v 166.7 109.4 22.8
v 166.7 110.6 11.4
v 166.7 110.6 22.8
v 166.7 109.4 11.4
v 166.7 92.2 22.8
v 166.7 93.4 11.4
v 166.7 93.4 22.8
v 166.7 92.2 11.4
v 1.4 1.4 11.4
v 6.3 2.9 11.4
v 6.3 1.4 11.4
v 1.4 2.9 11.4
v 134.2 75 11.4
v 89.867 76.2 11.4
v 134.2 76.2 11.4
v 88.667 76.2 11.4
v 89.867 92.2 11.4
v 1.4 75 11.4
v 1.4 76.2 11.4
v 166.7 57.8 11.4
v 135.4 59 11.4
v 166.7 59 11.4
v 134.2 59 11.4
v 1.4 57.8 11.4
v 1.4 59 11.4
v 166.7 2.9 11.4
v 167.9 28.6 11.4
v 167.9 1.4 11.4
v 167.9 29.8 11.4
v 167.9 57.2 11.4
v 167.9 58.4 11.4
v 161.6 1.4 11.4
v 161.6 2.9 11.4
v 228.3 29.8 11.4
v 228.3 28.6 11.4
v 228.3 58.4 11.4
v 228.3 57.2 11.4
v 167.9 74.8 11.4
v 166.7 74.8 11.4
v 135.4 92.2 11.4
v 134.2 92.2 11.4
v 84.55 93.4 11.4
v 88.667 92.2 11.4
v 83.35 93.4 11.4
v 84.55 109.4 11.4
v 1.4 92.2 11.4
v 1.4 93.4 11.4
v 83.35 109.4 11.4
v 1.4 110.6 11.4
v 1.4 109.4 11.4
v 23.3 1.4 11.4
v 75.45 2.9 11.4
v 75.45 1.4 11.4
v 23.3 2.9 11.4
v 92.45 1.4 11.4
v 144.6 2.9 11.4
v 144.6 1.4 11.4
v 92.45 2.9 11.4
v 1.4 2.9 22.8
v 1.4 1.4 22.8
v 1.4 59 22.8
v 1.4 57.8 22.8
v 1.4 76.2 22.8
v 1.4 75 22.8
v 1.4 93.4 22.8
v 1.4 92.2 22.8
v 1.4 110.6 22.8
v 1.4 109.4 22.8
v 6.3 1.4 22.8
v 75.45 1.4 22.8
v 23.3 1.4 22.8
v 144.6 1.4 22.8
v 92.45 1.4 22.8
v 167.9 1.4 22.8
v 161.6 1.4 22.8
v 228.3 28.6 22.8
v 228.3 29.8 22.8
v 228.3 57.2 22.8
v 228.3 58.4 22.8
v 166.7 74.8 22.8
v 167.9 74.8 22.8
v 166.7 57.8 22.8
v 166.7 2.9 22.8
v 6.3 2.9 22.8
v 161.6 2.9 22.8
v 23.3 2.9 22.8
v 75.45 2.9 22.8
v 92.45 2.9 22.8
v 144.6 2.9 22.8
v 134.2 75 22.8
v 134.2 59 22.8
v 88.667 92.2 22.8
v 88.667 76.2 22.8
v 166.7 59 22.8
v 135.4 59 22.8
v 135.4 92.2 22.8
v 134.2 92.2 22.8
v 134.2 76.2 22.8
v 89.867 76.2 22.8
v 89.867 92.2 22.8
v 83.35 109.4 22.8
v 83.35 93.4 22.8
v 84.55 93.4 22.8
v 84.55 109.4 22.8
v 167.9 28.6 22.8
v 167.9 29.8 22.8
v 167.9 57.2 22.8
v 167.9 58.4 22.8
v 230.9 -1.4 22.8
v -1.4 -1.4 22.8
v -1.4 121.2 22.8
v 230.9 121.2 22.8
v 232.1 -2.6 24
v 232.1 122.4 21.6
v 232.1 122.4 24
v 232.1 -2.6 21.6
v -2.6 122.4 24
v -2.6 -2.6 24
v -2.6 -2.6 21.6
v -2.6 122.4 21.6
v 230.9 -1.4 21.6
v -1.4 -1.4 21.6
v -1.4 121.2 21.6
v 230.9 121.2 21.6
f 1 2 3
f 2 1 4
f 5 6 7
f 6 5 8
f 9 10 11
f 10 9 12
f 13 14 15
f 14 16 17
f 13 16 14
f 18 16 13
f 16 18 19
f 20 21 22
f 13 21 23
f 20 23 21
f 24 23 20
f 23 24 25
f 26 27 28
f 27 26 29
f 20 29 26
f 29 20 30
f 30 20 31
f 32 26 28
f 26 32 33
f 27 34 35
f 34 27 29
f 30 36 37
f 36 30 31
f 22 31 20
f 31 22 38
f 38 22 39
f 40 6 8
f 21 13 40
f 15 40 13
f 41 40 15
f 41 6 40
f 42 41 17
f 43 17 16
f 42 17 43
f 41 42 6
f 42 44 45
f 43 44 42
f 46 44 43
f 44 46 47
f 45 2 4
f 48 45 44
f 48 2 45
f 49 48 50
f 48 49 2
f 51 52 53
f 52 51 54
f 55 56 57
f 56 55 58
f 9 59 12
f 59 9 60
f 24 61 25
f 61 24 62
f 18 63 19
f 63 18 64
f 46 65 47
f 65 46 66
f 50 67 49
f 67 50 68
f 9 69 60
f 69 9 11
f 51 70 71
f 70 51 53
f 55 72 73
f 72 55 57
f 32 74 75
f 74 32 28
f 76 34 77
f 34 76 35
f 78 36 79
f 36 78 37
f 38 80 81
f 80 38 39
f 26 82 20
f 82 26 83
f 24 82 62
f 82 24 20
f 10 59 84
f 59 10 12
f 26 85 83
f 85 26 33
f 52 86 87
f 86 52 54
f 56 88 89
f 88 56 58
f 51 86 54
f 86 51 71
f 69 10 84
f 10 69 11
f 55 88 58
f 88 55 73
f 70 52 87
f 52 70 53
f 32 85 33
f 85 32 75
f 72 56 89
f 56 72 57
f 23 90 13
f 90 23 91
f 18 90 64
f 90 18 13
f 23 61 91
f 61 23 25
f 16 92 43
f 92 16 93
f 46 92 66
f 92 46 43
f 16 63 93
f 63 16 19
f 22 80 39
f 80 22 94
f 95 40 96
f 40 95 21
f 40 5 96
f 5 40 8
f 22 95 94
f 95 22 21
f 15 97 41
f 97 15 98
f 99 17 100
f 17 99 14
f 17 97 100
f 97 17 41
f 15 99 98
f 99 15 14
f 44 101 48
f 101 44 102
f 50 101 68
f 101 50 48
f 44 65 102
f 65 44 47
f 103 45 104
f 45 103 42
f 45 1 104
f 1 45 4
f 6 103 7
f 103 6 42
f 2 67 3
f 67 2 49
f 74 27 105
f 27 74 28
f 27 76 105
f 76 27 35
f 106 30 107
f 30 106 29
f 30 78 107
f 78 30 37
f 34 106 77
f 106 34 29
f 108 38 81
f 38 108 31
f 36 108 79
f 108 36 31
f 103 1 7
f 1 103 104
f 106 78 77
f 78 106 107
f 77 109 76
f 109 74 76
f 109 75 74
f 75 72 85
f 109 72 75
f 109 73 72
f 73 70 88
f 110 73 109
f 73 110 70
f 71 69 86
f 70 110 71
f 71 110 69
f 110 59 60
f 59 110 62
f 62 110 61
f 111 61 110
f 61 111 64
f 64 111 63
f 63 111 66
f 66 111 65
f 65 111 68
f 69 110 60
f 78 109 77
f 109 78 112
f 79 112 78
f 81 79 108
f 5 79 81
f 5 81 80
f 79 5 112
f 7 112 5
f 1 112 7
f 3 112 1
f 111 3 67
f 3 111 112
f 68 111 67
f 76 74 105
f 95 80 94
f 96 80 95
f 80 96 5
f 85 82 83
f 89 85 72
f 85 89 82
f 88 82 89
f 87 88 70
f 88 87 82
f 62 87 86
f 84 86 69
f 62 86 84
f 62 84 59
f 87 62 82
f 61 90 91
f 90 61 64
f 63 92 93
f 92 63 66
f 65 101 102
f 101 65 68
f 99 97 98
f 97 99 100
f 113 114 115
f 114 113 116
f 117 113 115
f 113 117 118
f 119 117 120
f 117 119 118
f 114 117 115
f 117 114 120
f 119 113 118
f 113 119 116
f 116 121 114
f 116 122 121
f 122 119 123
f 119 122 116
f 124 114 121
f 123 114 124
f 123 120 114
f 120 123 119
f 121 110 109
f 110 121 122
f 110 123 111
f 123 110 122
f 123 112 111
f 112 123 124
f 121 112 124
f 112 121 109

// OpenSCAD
generate_box = false;//true to generate box, false for lid

//breadboard size
length = 165.1; //longer side of the breadboard
width = 54.5; //shorter side of the breadboard. Include dovetails if it exists.
height = 10; //height of the breadboard

dovetail_width = 1.5; //width of the dovetailes sticking out on the longer side
front_dovetail = true; //true if you want the dovetail sticking out on the long side to be facing you. 

//jumper wires. Makes 7 compartments based on these numberes
long_wire = 128; //longest jumper wire in the set plus. Must be decently shorter than length of the breadboard.
wire_height = 8; //length of the bent part of the wire

wire_clearance = 5; //minimum extra width for jumper wires

//batteries. 2 x 9V, 1 x AA
AA_diameter = 16;
9V_Width = 27;
battery_length = 60; //length of battery including clearence for fingers for both battery types

//misc
clearence = 0.2; //general clearence for misc components
wall_width = 1.2; //width of walls
max_height = 20; //max height of the contents of the box

//constants with clearence
Clength = length + clearence*2;
Cwidth = width + clearence*2;
Cheight = height + clearence;
Cdovetail_width = dovetail_width + clearence;

Clong_wire = long_wire + wire_clearance;
Cwire_height = wire_height*2;

CAA_diameter = AA_diameter + clearence*2;
C9V_Width = 9V_Width + clearence*2;
Cbattery_length = battery_length + clearence*2;

Cmax_height = max_height + clearence*2;

//Other calculated
TLength = Clength + Cbattery_length + wall_width*3; //total length
TWidth = Cwidth + Cdovetail_width + Cwire_height*3 + wire_height + wall_width*6; //total width
THeight = Cmax_height + wall_width*2; //total height

if (generate_box == true) { //generate box
    difference () { //cut away sections from main body
        cube([TLength, TWidth, THeight]); //main body
        
        if(front_dovetail == true) {
            translate([wall_width, wall_width + Cdovetail_width, wall_width]) { //breadboard
                cube([Clength, Cwidth, THeight]); 
                translate([Cdovetail_width*3, -Cdovetail_width, 0]) { //dovetail cutoff
                    cube([Cdovetail_width*10, Cdovetail_width, THeight]);
                }
                translate([Clength/2-Cdovetail_width*5, -Cdovetail_width, 0]) {
                    cube([Cdovetail_width*10, Cdovetail_width, THeight]);
                }
                translate([Clength-Cdovetail_width*3-Cdovetail_width*10, -Cdovetail_width, 0]) {
                    cube([Cdovetail_width*10, Cdovetail_width, THeight]);
                }
            }
        } else {
            translate([wall_width, wall_width, wall_width]) { //breadboard
                cube([Clength, Cwidth, THeight]); 
                translate([Cdovetail_width*3, Cwidth, 0]) { //dovetail cutoff
                    cube([Cdovetail_width*10, Cdovetail_width, THeight]);
                }
                translate([Clength/2-Cdovetail_width*5, Cwidth, 0]) {
                    cube([Cdovetail_width*10, Cdovetail_width, THeight]);
                }
                translate([Clength-Cdovetail_width*3-Cdovetail_width*10, Cwidth, 0]) {
                    cube([Cdovetail_width*10, Cdovetail_width, THeight]);
                }
            }
        }
        translate([wall_width, wall_width, wall_width + Cheight]) { //top of breadboard
            cube([Clength, Cwidth + Cdovetail_width, THeight]);
        }
        
        translate([wall_width, wall_width + Cdovetail_width + Cwidth + wall_width, wall_width]) { //jumper wire and other long compartments
            cube([Clong_wire, Cwire_height, THeight]);
            translate([0, wall_width + Cwire_height, 0]) {
                cube([Clong_wire*2/3 - wall_width, Cwire_height, THeight]);
            }
            translate([Clong_wire + wall_width, 0, 0]) {
                cube([Clength - Clong_wire - wall_width, Cwire_height * 2 + wall_width, THeight]);
            }
            translate([Clong_wire*2/3, wall_width + Cwire_height, 0]) {
                cube([Clong_wire*1/3, Cwire_height, THeight]);
            }
            translate([0, wall_width + Cwire_height*2 + wall_width, 0]) {
                cube([Clength/2 - wall_width/2, Cwire_height, THeight]);
            }
            translate([Clength/2 + wall_width/2, wall_width + Cwire_height*2 + wall_width, 0]) {
                cube([Clength/2 - wall_width/2, Cwire_height, THeight]);
            }
            translate([0, wall_width + Cwire_height*3 + wall_width*2, 0]) {
                cube([Clength, wire_height, THeight]);
            }
        }
        translate([wall_width, wall_width + Cdovetail_width + Cwidth, wall_width + Cheight]) { //top of jumperes
            cube([Clength, Cwidth + Cdovetail_width + wall_width, THeight]);
        }
        
        translate([Clength + wall_width*2, wall_width, wall_width]) { //batteries
            cube([Cbattery_length, C9V_Width, THeight]);
            translate([0, C9V_Width + wall_width, 0]) {
            cube([Cbattery_length, C9V_Width, THeight]);
            }
            translate([0, C9V_Width*2 + wall_width*2, 0]) {
            cube([Cbattery_length, CAA_diameter, THeight]);
            }
        }
        translate([Clength + wall_width, wall_width, wall_width + Cheight]) { //top of batteries
            cube([Cbattery_length + wall_width, C9V_Width*2 + wall_width*2 + CAA_diameter, THeight]);
        }
        
        translate([Clength + wall_width*2, C9V_Width*2 + wall_width*4 + CAA_diameter, wall_width]) { //misc parts
            cube([Cbattery_length, TWidth - (C9V_Width*2 + wall_width*5 + CAA_diameter), THeight]);
        }
    }
} else { //generate lid
    translate([-wall_width*2 - clearence, -wall_width*2 - clearence, THeight]) { //lid
                cube([TLength + wall_width*4 + clearence*2, TWidth + wall_width*4 + clearence*2, wall_width]);
    }
    translate([-wall_width*2 - clearence, -wall_width*2 - clearence, THeight - wall_width]) { //ledge
                cube([TLength + wall_width*4 + clearence*2, wall_width, wall_width]);
    }
    translate([-wall_width*2 - clearence, -wall_width*2 - clearence, THeight - wall_width]) { 
                cube([wall_width, TWidth + wall_width*4 + clearence*2, wall_width]);
    }
    translate([-wall_width*2 - clearence, TWidth + wall_width + clearence, THeight - wall_width]) { //ledge
                cube([TLength + wall_width*4 + clearence*2, wall_width, wall_width]);
    }
    translate([TLength + wall_width + clearence, -wall_width*2 - clearence, THeight - wall_width]) { 
                cube([wall_width, TWidth + wall_width*4 + clearence*2, wall_width]);
    }
    intersection() {
        union() {
            translate([wall_width + clearence, wall_width + clearence, wall_width + Cheight]) { //top of breadboard
                cube([Clength - clearence, Cwidth + Cdovetail_width - clearence, THeight]);
            }
            translate([wall_width + clearence, wall_width + Cdovetail_width + Cwidth, wall_width + Cheight]) { //top of jumperes
                cube([Clength - clearence, Cwidth + Cdovetail_width + wall_width, THeight]);
            }
            translate([Clength + wall_width, wall_width + clearence, wall_width + Cheight]) { //top of batteries
                cube([Cbattery_length + wall_width, C9V_Width*2 + wall_width*2 + CAA_diameter - clearence, THeight]);
            }
        }
        
        difference () { //cut away sections from main body
            cube([TLength, TWidth, THeight]); //main body
            
            if(front_dovetail == true) {
                translate([wall_width, wall_width + Cdovetail_width, wall_width]) { //breadboard
                    cube([Clength, Cwidth, THeight]); 
                    translate([Cdovetail_width*3, -Cdovetail_width, 0]) { //dovetail cutoff
                        cube([Cdovetail_width*10, Cdovetail_width, THeight]);
                    }
                    translate([Clength/2-Cdovetail_width*5, -Cdovetail_width, 0]) {
                        cube([Cdovetail_width*10, Cdovetail_width, THeight]);
                    }
                    translate([Clength-Cdovetail_width*3-Cdovetail_width*10, -Cdovetail_width, 0]) {
                        cube([Cdovetail_width*10, Cdovetail_width, THeight]);
                    }
                }
            } else {
                translate([wall_width, wall_width, wall_width]) { //breadboard
                    cube([Clength, Cwidth, THeight]); 
                    translate([Cdovetail_width*3, Cwidth, 0]) { //dovetail cutoff
                        cube([Cdovetail_width*10, Cdovetail_width, THeight]);
                    }
                    translate([Clength/2-Cdovetail_width*5, Cwidth, 0]) {
                        cube([Cdovetail_width*10, Cdovetail_width, THeight]);
                    }
                    translate([Clength-Cdovetail_width*3-Cdovetail_width*10, Cwidth, 0]) {
                        cube([Cdovetail_width*10, Cdovetail_width, THeight]);
                    }
                }
            }
            
            translate([wall_width, wall_width + Cdovetail_width + Cwidth + wall_width, wall_width]) { //jumper wire and other long compartments
                cube([Clong_wire, Cwire_height, THeight]);
                translate([0, wall_width + Cwire_height, 0]) {
                    cube([Clong_wire*2/3 - wall_width, Cwire_height, THeight]);
                }
                translate([Clong_wire + wall_width, 0, 0]) {
                    cube([Clength - Clong_wire - wall_width, Cwire_height * 2 + wall_width, THeight]);
                }
                translate([Clong_wire*2/3, wall_width + Cwire_height, 0]) {
                    cube([Clong_wire*1/3, Cwire_height, THeight]);
                }
                translate([0, wall_width + Cwire_height*2 + wall_width, 0]) {
                    cube([Clength/2 - wall_width/2, Cwire_height, THeight]);
                }
                translate([Clength/2 + wall_width/2, wall_width + Cwire_height*2 + wall_width, 0]) {
                    cube([Clength/2 - wall_width/2, Cwire_height, THeight]);
                }
                translate([0, wall_width + Cwire_height*3 + wall_width*2, 0]) {
                    cube([Clength, wire_height, THeight]);
                }
            }
            
            translate([Clength + wall_width*2, wall_width, wall_width]) { //batteries
                cube([Cbattery_length, C9V_Width, THeight]);
                translate([0, C9V_Width + wall_width, 0]) {
                cube([Cbattery_length, C9V_Width, THeight]);
                }
                translate([0, C9V_Width*2 + wall_width*2, 0]) {
                cube([Cbattery_length, CAA_diameter, THeight]);
                }
            }
            
            translate([Clength + wall_width*2, C9V_Width*2 + wall_width*4 + CAA_diameter, wall_width]) { //misc parts
                cube([Cbattery_length, TWidth - (C9V_Width*2 + wall_width*5 + CAA_diameter), THeight]);
            }
        }
    }
}
